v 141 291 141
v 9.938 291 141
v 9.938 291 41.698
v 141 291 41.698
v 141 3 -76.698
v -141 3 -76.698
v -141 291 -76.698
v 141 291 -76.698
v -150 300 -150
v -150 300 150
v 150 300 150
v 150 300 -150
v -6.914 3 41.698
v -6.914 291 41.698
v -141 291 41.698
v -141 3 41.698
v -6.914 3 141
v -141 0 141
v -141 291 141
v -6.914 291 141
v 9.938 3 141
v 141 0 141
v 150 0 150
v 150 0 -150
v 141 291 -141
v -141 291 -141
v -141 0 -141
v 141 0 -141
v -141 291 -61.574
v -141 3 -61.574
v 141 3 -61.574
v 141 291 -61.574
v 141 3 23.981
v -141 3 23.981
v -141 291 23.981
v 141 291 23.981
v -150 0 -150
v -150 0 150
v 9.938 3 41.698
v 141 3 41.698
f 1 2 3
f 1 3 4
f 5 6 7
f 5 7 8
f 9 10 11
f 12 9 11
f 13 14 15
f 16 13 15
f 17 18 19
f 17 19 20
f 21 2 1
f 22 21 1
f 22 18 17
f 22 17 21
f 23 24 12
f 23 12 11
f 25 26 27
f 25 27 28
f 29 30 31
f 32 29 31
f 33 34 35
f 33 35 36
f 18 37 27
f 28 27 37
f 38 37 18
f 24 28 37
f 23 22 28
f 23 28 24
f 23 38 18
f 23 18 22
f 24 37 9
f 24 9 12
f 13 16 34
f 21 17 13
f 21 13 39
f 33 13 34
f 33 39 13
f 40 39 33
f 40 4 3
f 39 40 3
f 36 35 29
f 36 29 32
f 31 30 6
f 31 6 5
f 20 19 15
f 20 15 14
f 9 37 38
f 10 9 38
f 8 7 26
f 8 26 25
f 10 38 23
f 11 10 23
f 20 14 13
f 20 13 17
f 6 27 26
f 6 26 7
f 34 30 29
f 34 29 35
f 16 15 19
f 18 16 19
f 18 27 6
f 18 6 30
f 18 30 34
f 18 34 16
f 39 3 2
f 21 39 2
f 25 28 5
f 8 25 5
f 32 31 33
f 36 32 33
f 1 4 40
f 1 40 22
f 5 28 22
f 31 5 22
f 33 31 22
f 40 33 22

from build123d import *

# Parameters (mm, degrees)
F0_W     = 300
F0_H     = 300
F1_DEPTH = 300
F2_T     = -9
F3_W     = 282
F3_H     = 15.1234567165
F3_W_2   = 16.8518549763
F3_H_2   = 10.3703700006
F3_H_3   = 99.3024680614
F4_DEPTH = 288


with BuildPart() as f1:
    # F0 (on Front) → F1 (new body)
    with BuildSketch(Plane.XZ):
        Rectangle(F0_W, F0_H)
    extrude(amount=-F1_DEPTH)

    # F2
    f2_openings = [f1.faces().sort_by_distance(p)[0] for p in [
        (0, 0, 0),
    ]]
    offset(amount=F2_T, openings=f2_openings)

    # F3 (on face) → F4 (join)
    with BuildSketch(Plane.XZ.offset(-291)):
        Polygon((-141, 41.6975319386), (-141, 23.9814817905), (141, 23.9814817905), (141, 41.6975319386), (9.9382726476, 41.6975319386), (9.9382726476, 31.327161938), (-6.9135823287, 31.327161938), (-6.9135823287, 41.6975319386), align=None)
        with Locations((0, -69.1358074546)):
            Rectangle(F3_W, F3_H)
        with Locations((1.5123451594, 36.5123469383)):
            Rectangle(F3_W_2, F3_H_2)
        with Locations((1.5123451594, 91.3487659693)):
            Rectangle(F3_W_2, F3_H_3)
    extrude(amount=F4_DEPTH)


solid = f1.part
